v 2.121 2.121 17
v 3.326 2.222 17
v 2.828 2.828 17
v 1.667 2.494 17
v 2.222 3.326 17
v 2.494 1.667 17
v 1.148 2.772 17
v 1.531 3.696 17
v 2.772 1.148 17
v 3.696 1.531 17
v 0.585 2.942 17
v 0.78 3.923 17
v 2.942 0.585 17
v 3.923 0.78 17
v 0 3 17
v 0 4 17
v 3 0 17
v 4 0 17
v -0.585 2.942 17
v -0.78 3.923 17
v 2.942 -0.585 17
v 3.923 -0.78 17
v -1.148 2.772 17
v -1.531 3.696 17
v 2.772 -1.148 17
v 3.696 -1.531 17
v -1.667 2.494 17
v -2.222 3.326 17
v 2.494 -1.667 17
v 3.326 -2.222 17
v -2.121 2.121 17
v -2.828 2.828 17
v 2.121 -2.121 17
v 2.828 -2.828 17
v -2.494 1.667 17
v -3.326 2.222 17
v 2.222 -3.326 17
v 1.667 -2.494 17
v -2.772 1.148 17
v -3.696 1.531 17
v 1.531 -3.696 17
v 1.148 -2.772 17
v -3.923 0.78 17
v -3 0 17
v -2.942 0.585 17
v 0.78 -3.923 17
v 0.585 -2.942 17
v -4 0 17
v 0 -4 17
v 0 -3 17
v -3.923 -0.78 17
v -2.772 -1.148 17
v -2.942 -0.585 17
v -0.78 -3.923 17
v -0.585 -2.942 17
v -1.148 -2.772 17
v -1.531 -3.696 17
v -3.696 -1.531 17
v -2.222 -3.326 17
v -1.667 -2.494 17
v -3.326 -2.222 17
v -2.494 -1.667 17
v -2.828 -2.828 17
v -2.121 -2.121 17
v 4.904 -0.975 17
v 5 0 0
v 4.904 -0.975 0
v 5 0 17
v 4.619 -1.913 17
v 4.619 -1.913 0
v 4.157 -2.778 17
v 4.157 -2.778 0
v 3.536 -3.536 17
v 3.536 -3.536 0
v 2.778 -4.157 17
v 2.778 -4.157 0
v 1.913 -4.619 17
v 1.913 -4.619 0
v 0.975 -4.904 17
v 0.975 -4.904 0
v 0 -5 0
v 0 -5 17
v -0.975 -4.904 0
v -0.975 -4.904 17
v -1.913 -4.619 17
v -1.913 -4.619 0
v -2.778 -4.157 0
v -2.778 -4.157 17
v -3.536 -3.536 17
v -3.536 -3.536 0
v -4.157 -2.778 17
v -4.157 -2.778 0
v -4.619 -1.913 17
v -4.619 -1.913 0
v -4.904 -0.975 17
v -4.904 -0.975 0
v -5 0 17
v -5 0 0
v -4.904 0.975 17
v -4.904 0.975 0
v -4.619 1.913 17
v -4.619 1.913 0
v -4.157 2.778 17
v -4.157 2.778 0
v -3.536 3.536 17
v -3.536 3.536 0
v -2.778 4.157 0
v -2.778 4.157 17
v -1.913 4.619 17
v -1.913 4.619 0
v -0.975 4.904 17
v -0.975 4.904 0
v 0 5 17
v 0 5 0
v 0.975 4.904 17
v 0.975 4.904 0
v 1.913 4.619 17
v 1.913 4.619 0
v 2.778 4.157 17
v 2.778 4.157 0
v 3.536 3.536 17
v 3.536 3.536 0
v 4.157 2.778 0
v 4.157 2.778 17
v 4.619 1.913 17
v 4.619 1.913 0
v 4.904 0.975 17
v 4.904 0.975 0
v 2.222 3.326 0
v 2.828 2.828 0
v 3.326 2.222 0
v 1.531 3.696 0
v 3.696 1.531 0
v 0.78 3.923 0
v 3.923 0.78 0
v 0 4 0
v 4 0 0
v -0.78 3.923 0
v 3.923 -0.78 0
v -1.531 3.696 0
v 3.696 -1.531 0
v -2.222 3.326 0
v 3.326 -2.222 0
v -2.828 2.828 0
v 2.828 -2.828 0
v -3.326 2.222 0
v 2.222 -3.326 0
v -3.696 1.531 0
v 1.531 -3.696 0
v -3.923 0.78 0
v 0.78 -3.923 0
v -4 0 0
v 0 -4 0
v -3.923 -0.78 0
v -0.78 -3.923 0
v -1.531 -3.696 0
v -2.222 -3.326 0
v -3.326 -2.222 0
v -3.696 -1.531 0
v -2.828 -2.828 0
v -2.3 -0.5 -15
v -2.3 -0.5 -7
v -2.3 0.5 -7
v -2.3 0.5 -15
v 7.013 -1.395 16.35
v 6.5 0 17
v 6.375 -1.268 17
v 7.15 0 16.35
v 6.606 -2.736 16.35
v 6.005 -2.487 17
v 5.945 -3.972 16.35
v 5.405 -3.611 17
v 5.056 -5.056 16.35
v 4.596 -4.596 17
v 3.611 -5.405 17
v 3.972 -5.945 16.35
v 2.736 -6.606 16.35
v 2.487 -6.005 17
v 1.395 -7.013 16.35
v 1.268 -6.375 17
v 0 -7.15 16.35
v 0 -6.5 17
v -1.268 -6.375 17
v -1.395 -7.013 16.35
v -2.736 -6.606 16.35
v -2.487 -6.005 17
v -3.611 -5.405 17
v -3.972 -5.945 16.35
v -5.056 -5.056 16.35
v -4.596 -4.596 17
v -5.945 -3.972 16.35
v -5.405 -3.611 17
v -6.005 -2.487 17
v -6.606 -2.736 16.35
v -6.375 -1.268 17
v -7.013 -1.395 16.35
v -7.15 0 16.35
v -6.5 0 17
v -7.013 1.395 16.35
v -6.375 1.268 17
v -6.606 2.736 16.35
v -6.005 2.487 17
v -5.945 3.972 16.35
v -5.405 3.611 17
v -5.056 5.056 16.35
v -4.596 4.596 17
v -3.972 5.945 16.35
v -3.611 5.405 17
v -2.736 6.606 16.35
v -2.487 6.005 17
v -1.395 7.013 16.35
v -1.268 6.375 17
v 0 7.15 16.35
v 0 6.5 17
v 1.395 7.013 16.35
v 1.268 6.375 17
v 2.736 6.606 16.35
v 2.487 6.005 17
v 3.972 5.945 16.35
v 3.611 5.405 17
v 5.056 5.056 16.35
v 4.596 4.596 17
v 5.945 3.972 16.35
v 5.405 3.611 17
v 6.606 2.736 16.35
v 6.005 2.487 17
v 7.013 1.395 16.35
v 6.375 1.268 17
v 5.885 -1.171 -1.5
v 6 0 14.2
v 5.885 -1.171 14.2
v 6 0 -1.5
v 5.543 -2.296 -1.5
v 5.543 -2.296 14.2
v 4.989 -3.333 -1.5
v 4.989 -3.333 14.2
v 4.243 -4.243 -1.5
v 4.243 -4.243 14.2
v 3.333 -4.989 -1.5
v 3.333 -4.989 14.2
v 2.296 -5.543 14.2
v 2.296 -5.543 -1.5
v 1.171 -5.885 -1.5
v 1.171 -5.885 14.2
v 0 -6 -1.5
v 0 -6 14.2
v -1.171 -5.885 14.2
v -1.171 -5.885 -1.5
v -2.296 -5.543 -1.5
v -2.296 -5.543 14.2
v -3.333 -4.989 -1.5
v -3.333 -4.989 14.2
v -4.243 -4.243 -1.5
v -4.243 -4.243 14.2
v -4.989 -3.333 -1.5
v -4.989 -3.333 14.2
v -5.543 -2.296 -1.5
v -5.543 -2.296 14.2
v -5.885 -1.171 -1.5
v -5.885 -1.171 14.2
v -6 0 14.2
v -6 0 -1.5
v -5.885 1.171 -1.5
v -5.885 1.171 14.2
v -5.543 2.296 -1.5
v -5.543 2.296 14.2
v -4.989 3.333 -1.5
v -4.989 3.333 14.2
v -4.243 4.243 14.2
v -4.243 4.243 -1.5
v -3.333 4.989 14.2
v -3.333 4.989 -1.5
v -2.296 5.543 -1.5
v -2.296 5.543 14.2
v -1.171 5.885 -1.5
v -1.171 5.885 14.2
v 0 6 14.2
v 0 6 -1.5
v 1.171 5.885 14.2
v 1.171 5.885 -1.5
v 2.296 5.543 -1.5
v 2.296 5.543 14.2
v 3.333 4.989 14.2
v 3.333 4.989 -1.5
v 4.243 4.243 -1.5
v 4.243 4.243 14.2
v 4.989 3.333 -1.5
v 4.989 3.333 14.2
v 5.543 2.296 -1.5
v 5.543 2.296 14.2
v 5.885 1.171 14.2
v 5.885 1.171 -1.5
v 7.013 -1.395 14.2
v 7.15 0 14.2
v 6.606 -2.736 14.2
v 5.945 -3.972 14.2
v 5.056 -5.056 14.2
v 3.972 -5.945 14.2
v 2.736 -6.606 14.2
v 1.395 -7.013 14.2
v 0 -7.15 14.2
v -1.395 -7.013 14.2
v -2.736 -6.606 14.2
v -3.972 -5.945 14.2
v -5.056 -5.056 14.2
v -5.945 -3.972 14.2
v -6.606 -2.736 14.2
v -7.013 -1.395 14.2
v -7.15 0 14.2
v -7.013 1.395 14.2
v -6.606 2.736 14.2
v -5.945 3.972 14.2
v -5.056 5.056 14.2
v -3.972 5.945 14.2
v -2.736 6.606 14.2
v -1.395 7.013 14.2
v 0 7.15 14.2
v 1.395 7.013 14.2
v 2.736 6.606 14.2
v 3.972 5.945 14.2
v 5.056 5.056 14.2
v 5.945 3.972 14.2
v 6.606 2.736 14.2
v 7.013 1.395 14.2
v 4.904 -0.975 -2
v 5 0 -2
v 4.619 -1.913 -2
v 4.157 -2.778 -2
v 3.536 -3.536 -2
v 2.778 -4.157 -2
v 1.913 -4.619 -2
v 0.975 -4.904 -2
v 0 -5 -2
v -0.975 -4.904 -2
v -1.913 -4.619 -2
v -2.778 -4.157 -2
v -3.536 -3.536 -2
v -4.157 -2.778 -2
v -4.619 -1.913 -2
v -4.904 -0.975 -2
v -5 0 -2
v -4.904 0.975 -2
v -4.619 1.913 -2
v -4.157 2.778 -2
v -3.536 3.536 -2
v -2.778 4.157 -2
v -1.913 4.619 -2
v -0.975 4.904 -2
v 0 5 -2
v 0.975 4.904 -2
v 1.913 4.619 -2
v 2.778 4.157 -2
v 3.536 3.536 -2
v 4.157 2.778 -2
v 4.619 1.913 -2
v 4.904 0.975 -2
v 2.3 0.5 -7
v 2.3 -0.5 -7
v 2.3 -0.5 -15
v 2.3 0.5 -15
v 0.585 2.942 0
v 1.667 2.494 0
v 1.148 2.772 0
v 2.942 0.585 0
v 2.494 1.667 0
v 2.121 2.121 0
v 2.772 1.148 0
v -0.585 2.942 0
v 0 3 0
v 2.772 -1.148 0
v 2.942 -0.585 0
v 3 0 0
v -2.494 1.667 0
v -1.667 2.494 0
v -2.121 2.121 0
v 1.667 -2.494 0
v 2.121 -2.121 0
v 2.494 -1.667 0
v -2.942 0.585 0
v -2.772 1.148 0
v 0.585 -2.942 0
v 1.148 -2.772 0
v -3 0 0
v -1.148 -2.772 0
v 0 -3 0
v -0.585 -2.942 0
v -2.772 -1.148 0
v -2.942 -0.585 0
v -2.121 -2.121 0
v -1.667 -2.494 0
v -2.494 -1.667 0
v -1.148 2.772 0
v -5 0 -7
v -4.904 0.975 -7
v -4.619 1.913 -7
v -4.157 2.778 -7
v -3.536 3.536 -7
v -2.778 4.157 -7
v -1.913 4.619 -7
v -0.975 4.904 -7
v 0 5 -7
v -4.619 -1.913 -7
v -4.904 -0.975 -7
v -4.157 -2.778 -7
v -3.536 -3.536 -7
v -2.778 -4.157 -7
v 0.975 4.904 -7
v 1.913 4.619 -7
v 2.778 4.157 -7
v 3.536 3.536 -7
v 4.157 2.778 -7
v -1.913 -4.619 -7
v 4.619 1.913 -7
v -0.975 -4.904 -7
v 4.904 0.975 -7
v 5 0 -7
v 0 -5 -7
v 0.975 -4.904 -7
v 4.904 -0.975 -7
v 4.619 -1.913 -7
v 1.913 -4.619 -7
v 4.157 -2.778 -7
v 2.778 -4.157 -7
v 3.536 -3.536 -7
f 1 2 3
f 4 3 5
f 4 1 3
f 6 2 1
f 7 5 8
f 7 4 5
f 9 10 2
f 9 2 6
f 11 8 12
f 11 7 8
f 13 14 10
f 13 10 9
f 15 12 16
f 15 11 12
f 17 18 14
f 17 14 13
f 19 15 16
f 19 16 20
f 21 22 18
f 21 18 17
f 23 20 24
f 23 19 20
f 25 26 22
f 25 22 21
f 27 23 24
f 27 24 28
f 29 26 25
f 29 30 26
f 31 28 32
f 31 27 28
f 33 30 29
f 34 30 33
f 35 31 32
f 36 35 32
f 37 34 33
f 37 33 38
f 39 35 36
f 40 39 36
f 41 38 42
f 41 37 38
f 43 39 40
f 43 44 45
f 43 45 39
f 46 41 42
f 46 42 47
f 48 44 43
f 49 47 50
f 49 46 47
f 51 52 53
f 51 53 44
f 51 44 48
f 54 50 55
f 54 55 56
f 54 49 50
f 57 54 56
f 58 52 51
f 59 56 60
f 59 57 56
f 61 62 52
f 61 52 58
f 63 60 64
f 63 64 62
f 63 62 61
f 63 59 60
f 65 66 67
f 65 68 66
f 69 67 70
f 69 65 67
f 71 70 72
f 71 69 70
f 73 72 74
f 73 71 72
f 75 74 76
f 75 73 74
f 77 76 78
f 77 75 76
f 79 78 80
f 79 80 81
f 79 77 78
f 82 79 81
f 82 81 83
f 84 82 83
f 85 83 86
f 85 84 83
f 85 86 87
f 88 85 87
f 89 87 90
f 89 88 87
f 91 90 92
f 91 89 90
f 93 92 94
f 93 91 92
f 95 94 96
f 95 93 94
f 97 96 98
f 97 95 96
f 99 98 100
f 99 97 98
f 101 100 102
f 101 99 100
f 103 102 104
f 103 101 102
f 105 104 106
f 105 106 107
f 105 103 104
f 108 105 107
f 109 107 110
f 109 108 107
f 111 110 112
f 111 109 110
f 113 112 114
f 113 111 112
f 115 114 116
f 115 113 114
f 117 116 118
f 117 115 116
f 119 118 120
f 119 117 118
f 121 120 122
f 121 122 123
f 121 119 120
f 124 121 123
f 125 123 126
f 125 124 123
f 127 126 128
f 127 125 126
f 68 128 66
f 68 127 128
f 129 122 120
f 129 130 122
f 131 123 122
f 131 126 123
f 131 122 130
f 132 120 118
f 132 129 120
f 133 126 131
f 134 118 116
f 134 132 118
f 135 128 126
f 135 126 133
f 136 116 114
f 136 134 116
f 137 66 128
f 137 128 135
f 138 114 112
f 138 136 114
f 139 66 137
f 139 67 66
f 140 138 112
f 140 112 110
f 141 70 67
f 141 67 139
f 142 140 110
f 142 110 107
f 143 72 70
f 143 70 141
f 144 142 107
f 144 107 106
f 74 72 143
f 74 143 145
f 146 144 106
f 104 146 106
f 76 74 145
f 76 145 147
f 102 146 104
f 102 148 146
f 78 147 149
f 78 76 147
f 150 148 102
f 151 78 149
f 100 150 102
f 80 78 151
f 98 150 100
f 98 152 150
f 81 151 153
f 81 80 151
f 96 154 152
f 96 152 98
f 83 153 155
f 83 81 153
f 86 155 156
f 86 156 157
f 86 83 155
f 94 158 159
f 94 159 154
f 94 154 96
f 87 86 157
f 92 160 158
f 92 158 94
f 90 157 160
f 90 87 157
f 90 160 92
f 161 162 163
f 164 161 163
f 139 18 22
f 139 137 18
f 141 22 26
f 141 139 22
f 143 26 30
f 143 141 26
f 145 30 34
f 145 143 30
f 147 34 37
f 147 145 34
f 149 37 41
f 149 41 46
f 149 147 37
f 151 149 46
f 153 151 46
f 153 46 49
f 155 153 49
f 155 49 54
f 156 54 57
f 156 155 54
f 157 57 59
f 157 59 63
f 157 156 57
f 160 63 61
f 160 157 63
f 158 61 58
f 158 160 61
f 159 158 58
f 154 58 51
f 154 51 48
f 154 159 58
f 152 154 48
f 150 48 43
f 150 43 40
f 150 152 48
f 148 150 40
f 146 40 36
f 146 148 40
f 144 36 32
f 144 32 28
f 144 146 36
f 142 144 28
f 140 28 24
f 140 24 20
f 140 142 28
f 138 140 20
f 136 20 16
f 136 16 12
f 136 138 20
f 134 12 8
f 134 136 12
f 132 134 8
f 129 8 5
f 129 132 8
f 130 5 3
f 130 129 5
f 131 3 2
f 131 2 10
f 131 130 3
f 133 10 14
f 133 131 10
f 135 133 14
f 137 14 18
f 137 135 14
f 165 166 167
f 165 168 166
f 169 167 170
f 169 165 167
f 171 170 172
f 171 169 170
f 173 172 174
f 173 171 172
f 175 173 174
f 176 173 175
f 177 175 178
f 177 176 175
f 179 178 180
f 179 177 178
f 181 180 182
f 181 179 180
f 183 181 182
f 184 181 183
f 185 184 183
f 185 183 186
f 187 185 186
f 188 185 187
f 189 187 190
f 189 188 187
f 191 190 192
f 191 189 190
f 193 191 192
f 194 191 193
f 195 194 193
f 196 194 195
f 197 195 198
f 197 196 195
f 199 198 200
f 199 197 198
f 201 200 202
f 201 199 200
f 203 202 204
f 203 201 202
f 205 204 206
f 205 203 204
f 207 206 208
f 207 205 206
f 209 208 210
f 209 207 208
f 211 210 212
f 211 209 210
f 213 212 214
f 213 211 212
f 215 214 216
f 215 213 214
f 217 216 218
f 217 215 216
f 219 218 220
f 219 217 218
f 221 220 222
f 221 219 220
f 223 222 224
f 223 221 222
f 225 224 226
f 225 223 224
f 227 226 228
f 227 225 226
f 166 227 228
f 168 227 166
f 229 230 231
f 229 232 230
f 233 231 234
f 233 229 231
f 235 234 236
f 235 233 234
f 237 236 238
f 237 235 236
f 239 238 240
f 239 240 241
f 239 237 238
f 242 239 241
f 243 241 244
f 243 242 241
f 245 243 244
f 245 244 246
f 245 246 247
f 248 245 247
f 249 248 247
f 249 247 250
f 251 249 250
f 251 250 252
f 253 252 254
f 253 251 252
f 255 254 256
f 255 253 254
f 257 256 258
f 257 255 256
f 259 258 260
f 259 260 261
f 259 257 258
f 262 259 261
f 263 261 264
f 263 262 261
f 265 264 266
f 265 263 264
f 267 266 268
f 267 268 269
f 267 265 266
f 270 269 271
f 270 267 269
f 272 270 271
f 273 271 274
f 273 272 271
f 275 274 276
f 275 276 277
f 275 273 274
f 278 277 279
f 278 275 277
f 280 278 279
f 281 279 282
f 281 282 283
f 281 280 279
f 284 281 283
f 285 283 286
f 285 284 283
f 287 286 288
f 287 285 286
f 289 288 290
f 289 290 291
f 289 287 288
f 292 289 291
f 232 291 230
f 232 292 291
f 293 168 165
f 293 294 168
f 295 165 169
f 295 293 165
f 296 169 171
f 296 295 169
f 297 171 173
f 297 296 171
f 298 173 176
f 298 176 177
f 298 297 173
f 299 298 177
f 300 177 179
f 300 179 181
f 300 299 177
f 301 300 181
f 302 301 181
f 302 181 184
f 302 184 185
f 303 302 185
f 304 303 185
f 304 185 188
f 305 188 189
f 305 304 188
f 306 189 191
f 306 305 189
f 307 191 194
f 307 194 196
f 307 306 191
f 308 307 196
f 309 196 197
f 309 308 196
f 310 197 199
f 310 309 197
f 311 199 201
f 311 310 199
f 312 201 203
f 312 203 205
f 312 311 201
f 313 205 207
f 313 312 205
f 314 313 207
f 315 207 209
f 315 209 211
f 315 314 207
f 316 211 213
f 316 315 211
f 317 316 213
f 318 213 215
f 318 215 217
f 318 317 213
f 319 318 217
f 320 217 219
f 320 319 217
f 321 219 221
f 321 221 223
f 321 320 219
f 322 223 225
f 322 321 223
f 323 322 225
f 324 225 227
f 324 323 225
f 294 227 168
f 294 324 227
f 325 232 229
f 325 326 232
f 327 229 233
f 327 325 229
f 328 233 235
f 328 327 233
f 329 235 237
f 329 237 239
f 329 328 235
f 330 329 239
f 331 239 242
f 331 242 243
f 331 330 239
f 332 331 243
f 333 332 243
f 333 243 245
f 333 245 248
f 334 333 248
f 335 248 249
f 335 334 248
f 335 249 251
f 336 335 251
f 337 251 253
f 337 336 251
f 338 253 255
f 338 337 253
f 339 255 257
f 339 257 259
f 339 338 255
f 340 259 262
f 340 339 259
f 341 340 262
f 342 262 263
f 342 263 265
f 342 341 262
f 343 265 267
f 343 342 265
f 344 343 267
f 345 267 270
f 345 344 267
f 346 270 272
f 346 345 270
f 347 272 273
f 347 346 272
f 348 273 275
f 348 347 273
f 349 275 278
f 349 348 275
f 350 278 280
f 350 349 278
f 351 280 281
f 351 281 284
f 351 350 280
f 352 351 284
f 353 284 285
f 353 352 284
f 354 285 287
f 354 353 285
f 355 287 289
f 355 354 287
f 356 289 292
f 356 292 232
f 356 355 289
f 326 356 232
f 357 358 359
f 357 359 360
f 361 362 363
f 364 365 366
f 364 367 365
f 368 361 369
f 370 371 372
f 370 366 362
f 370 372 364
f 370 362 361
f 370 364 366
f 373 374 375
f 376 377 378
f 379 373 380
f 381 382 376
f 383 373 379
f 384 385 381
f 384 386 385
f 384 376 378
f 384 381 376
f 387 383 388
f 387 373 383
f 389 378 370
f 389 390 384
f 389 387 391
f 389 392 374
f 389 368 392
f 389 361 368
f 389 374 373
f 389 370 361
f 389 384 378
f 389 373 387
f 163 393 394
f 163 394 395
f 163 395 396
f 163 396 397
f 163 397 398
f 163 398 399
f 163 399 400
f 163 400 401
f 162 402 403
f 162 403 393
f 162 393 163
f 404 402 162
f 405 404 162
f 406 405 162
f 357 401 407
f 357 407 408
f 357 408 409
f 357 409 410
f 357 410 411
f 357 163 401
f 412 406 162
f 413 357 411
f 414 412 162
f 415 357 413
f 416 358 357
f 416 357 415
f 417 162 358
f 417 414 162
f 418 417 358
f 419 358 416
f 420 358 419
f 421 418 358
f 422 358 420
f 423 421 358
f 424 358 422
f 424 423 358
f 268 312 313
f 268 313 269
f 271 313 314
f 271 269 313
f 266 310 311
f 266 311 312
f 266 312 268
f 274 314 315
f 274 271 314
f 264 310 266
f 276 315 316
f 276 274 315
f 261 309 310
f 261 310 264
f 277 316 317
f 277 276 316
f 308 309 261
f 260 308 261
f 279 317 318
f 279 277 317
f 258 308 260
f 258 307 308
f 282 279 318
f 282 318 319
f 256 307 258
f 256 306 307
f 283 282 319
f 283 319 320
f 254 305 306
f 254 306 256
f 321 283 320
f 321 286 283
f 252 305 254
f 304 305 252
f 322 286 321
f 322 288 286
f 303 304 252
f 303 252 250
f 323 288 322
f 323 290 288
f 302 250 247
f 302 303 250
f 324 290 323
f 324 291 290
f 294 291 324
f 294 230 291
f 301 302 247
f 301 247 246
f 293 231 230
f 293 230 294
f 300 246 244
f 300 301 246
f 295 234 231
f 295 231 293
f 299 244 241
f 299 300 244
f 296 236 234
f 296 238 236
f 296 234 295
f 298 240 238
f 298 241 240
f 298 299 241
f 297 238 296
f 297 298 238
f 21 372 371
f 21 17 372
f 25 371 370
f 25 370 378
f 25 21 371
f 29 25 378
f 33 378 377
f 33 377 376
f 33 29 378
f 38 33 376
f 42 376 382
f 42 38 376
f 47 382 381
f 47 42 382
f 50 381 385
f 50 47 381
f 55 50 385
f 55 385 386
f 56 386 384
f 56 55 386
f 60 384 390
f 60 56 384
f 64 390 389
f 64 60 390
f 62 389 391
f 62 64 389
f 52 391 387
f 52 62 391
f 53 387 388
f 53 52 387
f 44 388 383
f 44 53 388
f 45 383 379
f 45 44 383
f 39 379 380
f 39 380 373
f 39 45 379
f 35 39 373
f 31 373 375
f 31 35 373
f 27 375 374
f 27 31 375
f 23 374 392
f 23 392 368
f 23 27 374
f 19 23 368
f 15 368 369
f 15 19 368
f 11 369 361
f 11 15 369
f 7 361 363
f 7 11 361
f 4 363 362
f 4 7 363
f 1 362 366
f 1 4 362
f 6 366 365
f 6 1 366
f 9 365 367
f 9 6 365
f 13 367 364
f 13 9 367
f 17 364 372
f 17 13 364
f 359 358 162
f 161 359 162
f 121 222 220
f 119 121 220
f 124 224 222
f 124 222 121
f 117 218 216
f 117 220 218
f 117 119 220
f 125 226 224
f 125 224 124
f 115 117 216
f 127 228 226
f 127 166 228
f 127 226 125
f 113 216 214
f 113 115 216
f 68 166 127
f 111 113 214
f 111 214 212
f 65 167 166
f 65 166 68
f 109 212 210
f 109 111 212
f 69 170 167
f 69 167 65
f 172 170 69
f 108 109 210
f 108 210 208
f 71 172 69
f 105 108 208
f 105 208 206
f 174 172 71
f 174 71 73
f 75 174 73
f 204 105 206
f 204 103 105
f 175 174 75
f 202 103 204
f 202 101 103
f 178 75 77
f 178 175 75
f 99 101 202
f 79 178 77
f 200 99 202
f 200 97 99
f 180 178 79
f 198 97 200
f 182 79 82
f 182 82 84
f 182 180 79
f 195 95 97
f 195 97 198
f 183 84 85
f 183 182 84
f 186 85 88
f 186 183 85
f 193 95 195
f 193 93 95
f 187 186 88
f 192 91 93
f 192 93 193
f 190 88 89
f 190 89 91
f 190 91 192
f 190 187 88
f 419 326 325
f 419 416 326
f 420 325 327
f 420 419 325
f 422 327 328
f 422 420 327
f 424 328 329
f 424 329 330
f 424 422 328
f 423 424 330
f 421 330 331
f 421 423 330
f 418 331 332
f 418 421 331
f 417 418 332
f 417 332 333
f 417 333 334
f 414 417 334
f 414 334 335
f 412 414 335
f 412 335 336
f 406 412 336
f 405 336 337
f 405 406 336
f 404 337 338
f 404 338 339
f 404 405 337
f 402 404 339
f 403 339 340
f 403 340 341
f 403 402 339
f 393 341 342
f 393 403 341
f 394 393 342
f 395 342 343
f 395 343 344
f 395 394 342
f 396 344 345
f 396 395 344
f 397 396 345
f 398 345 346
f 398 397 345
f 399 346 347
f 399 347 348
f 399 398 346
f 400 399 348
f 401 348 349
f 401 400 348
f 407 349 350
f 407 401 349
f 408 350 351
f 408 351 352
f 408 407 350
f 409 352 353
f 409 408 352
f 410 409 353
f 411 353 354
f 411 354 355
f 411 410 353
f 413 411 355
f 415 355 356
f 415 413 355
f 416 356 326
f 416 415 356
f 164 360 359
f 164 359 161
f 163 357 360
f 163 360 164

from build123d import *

# Parameters (mm, degrees)
SCHIZZO2_W                   = 4.6
SCHIZZO2_H                   = 1
ESTRUSIONE_ESTRUSIONE1_DEPTH = 8


with BuildPart() as part:
    # Schizzo1 → Rivoluzione1 (revolve)
    with BuildSketch(Plane(origin=(0, 0, 0), x_dir=(0, 0, -1), z_dir=(1, 0, 0)), mode=Mode.PRIVATE) as rivoluzione1_sk:
        Polygon((-17, 6.5), (-16.35, 7.15), (-14.2, 7.15), (-14.2, 6), (1.5, 6), (2, 5), (7, 5), (7, 0), (0, 0), (0, 3), (-17, 3), (-17, 4), (0, 4), (0, 5), (-17, 5), align=None)
    revolve(rivoluzione1_sk.sketch.rotate(Axis((0, 0, 0), (0, 0, -1)), 90), axis=Axis((0, 0, 0), (0, 0, -1)))

    # Schizzo2 → Estrusione-Estrusione1 (add)
    with BuildSketch(Plane(origin=(0, 0, -7), x_dir=(-1, 0, 0), z_dir=(0, 0, -1))):
        Rectangle(SCHIZZO2_W, SCHIZZO2_H)
    extrude(amount=ESTRUSIONE_ESTRUSIONE1_DEPTH)


solid = part.part
